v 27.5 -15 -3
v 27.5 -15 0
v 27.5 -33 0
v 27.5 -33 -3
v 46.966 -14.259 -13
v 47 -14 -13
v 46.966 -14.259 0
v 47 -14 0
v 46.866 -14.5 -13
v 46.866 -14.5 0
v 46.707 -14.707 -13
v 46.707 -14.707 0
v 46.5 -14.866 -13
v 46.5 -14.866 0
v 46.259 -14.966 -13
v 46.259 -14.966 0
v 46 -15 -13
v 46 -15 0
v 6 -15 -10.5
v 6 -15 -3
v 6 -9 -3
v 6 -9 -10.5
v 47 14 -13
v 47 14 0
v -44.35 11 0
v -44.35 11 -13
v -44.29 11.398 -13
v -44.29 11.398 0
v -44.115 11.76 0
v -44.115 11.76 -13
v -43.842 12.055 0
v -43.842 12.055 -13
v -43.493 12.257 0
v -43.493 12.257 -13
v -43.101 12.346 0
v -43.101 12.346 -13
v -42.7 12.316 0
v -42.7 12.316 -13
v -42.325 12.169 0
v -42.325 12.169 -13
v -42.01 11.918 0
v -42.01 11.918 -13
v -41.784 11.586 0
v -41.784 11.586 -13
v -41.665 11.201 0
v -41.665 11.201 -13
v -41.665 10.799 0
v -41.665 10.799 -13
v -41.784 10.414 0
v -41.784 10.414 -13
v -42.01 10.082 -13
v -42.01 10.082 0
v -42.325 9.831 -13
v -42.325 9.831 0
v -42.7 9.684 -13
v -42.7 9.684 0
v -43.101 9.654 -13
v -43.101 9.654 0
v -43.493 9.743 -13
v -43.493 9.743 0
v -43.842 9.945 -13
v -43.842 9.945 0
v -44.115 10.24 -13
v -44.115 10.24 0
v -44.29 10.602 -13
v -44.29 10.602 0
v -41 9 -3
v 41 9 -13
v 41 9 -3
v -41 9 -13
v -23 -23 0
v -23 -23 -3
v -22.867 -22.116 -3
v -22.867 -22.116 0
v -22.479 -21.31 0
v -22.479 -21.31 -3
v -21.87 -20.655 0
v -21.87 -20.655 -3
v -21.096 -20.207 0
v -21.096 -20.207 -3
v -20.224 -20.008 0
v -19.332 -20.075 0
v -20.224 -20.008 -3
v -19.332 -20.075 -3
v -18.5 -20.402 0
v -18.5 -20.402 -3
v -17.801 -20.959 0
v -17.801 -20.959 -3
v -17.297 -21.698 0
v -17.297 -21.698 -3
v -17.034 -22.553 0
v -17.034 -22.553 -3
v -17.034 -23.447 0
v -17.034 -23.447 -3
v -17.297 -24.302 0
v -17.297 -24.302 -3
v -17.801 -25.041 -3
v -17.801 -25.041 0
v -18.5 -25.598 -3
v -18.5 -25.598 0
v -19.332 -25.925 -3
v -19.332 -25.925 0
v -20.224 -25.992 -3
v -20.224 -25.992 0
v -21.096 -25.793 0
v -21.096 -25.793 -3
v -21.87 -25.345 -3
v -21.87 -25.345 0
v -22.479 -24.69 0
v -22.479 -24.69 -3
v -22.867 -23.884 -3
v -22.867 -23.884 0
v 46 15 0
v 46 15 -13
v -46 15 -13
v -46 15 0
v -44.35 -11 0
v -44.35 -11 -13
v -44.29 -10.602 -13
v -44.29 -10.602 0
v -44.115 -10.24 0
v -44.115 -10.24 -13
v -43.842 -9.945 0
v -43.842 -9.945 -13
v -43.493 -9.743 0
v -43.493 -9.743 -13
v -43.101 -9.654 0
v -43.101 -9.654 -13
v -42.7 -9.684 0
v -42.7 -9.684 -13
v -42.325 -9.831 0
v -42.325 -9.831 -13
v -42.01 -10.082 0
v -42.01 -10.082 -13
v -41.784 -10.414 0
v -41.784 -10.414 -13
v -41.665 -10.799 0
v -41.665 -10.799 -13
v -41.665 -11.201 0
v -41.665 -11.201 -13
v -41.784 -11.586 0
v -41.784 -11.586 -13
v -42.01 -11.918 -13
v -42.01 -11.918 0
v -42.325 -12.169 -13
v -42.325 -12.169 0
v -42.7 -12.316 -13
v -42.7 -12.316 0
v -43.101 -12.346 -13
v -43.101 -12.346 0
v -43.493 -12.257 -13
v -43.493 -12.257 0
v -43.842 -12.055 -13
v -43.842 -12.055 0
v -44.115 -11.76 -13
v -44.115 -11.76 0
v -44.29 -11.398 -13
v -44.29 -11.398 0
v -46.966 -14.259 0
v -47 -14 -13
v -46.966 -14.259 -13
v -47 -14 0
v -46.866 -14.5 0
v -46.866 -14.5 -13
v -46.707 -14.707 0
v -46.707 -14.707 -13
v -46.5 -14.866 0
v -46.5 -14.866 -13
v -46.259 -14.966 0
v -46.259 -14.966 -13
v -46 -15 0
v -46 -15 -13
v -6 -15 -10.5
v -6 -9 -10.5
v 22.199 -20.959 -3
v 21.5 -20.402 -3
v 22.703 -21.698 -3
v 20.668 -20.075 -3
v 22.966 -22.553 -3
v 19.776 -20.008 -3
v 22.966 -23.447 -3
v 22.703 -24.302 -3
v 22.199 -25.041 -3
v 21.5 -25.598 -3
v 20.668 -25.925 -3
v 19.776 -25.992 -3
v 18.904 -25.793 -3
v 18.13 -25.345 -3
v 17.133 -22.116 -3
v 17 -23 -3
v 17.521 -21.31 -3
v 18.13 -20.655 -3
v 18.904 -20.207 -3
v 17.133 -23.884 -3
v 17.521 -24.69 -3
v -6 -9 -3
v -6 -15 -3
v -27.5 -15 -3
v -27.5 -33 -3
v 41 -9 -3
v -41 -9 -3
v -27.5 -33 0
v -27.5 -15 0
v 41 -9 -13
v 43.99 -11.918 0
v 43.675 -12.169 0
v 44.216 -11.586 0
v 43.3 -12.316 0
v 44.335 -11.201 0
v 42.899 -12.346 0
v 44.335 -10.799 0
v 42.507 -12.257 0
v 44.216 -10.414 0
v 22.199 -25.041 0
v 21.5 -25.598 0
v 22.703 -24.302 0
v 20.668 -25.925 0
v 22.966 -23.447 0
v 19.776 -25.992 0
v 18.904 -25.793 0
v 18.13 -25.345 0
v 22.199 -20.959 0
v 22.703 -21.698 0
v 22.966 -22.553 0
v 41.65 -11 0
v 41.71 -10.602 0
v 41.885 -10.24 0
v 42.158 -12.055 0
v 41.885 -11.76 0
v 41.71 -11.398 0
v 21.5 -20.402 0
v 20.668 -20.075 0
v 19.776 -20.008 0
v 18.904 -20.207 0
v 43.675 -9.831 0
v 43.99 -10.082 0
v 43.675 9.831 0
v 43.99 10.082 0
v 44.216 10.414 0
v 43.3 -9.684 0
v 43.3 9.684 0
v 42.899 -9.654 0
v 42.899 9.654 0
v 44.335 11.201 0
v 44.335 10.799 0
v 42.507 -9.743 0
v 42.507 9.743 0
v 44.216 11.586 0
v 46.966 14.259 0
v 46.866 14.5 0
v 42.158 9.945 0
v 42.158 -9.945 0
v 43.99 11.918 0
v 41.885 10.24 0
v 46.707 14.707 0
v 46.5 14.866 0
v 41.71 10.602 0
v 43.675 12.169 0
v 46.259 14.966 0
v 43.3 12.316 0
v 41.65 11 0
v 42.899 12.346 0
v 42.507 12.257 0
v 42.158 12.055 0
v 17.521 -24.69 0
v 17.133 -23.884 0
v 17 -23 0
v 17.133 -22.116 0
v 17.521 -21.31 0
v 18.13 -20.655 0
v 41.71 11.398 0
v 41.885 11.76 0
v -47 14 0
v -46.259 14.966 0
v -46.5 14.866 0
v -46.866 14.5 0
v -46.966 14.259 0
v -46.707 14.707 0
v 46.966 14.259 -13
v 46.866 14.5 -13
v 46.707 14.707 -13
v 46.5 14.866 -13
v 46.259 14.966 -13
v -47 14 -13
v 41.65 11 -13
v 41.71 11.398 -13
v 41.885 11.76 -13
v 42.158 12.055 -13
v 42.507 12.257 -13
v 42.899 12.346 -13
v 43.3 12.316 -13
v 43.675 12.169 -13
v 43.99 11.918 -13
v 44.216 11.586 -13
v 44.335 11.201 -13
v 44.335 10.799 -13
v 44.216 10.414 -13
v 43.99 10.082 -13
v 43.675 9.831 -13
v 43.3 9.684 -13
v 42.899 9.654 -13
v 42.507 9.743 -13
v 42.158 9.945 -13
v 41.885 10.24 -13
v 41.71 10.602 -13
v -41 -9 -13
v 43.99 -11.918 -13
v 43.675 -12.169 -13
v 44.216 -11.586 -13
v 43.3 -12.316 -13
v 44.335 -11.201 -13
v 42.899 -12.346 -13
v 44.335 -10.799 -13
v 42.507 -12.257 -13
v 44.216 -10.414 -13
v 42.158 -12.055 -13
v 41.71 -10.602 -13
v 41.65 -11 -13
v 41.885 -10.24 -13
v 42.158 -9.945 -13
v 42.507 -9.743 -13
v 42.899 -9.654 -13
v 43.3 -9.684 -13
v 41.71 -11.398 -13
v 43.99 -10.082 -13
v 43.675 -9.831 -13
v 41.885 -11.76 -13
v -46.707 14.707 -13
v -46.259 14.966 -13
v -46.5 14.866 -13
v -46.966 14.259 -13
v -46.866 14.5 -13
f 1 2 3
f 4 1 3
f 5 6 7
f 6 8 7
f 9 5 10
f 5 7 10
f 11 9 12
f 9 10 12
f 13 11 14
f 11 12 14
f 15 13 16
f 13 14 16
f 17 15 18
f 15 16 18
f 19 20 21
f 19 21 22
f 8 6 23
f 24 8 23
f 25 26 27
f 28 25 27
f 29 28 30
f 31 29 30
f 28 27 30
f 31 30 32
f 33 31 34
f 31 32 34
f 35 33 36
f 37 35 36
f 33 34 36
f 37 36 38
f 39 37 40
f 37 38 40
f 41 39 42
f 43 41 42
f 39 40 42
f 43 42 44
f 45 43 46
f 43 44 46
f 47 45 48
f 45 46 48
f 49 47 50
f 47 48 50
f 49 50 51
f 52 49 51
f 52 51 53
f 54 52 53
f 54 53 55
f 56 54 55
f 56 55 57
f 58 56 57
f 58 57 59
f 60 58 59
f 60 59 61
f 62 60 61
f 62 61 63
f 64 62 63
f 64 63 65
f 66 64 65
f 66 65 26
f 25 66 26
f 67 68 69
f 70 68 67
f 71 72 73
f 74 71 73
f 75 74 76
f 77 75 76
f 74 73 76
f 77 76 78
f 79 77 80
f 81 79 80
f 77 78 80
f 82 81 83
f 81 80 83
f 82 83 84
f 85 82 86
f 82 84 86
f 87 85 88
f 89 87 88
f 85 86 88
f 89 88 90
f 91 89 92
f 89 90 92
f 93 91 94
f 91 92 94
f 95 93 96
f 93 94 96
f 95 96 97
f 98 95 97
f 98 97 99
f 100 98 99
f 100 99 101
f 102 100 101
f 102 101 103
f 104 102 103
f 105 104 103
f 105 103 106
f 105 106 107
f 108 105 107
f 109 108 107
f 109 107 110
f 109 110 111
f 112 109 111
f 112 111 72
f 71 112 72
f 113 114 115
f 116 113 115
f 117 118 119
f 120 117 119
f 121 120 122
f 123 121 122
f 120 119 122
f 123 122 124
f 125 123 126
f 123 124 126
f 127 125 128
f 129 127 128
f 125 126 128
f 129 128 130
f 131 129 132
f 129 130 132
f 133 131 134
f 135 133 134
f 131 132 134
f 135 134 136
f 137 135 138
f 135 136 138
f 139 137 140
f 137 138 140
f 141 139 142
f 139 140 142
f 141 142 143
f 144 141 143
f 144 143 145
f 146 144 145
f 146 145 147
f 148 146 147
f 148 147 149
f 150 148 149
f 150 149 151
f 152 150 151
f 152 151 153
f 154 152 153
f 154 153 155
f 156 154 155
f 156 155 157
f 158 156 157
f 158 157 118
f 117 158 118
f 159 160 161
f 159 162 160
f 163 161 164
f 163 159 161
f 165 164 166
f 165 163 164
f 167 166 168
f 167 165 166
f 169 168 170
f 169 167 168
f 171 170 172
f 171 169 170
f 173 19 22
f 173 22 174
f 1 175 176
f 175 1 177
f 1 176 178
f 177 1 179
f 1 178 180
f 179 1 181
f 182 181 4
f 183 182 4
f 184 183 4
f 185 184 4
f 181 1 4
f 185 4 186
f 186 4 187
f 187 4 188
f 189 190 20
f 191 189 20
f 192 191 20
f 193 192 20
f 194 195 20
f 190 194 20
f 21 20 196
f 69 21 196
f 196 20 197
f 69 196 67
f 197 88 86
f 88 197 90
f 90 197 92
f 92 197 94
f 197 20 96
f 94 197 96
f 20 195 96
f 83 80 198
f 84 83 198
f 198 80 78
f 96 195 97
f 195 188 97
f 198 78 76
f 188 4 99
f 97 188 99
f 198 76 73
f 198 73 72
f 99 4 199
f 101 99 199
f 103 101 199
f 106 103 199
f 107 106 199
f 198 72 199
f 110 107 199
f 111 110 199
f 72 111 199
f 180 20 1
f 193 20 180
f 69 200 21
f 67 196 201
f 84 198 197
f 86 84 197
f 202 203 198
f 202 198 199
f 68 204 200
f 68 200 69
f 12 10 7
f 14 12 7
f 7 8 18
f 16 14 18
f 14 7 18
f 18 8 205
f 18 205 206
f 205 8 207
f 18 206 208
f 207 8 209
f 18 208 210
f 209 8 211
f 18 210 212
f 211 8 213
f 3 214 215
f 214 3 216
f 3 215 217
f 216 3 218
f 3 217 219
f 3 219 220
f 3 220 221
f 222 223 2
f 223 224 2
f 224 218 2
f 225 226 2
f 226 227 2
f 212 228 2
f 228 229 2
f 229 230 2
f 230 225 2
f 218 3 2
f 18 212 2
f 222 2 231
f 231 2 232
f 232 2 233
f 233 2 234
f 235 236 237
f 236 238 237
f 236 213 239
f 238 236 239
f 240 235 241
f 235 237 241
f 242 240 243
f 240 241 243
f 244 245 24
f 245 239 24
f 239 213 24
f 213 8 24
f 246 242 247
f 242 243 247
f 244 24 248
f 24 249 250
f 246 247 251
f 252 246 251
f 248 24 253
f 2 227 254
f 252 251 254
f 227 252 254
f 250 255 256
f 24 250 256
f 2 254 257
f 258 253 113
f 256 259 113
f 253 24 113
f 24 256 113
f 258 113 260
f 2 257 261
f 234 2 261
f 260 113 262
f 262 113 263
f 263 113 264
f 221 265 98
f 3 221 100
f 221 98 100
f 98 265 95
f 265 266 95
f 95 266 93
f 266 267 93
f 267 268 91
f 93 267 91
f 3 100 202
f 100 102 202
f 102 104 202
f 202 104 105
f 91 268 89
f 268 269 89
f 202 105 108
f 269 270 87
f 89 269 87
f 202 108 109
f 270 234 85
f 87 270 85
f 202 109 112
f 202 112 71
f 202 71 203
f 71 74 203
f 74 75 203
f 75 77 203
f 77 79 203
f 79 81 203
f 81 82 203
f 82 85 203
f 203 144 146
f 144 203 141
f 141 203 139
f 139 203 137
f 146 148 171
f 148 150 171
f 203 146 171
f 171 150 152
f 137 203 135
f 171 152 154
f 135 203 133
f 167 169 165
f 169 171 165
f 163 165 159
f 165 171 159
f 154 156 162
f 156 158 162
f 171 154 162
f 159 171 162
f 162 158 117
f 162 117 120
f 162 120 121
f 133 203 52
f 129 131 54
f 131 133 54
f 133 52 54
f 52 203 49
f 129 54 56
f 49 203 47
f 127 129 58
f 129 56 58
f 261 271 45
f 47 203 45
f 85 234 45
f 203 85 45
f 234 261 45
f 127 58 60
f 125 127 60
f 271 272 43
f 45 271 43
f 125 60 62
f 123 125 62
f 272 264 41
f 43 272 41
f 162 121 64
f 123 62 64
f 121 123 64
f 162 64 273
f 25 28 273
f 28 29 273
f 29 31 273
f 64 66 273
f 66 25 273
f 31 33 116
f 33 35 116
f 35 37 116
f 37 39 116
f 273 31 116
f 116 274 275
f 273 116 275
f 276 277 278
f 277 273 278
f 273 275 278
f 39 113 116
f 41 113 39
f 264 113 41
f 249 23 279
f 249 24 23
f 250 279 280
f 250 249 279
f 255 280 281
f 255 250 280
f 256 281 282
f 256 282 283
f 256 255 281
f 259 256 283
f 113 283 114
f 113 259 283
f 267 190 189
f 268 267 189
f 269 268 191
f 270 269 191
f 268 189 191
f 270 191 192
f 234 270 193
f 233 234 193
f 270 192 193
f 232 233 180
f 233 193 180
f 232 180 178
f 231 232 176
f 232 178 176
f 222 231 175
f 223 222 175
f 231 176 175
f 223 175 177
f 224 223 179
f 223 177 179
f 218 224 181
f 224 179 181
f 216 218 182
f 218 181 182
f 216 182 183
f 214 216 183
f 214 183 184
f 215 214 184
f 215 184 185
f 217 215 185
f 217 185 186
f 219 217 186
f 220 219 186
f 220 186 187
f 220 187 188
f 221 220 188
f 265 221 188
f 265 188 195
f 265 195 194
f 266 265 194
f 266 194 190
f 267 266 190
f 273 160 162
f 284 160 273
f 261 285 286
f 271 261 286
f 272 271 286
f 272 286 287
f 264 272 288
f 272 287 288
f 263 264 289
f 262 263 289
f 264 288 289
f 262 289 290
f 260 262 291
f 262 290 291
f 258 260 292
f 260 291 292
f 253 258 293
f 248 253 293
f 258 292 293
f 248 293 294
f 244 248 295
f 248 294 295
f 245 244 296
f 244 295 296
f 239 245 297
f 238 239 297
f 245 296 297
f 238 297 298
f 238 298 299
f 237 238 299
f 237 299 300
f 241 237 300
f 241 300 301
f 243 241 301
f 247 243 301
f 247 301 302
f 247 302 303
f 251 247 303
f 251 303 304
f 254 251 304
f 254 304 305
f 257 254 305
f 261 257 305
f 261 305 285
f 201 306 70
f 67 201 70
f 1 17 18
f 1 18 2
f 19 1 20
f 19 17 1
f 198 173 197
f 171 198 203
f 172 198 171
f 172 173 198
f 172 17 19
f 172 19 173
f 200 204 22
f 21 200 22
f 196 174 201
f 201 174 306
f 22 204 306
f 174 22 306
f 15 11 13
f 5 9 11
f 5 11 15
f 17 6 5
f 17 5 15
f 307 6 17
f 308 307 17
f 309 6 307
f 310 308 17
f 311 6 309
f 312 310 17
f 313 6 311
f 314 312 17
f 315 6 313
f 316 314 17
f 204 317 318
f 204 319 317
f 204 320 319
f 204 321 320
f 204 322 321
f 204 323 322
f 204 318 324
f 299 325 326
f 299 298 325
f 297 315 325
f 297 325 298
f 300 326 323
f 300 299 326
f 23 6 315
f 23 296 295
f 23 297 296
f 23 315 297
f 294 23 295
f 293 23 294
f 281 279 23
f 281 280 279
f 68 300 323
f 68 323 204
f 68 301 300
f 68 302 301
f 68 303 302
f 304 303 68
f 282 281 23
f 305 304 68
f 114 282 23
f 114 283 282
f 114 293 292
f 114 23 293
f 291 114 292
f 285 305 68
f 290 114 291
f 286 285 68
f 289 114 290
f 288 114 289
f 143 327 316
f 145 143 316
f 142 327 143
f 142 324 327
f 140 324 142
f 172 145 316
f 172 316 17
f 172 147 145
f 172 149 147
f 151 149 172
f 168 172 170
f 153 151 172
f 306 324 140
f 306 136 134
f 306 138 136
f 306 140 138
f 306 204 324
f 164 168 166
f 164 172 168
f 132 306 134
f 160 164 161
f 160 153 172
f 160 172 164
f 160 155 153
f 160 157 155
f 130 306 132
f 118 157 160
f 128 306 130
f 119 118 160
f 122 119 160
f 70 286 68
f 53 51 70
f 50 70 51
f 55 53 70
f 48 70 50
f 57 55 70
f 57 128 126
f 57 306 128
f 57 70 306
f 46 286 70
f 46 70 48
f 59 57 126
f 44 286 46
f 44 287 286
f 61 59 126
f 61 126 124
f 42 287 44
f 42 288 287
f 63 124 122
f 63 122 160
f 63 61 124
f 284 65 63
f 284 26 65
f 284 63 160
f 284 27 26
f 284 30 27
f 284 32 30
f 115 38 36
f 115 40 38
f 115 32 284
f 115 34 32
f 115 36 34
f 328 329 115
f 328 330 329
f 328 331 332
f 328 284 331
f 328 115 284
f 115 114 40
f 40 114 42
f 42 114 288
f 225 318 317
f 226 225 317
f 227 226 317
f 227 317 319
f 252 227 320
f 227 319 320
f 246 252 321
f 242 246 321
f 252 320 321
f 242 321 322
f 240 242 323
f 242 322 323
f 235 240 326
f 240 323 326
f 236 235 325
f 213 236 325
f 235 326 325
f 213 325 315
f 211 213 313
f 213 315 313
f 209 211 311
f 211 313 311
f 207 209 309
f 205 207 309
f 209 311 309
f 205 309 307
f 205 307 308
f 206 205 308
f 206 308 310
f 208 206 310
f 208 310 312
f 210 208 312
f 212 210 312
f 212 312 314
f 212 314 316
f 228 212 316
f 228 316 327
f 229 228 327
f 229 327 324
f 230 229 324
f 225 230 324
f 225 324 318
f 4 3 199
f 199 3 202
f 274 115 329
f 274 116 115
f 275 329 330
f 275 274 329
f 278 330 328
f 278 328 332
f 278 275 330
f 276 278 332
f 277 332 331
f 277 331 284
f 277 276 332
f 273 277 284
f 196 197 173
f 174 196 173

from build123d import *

# Parameters (mm, degrees)
SKETCH001_W          = 94
SKETCH001_H          = 30
PAD_DEPTH            = 13
SKETCH002_R          = 1.35
HOLE_DEPTH           = 25
SKETCH_W             = 82
SKETCH_H             = 18
POCKET_DEPTH         = 10
SKETCH003_W          = 55
SKETCH003_H          = 21
PAD001_DEPTH         = 3
FILLET_R             = 1
SKETCH004_R          = 3
HOLE001_DEPTH        = 25
SKETCH010_W          = 12
SKETCH010_H          = 7.5
POCKET001_DEPTH      = 6
BODY_PLACEMENT_ANGLE = 180


with BuildPart() as part:
    # Sketch001 → Pad (new body)
    with BuildSketch(Plane.XY):
        Rectangle(SKETCH001_W, SKETCH001_H)
    extrude(amount=-PAD_DEPTH)

    # Sketch002 (on Face5 of Pad) → Hole (cut)
    with BuildSketch(Plane.XY):
        with Locations((-43, 11)):
            Circle(SKETCH002_R)
        with Locations((-43, -11)):
            Circle(SKETCH002_R)
        with Locations((43, 11)):
            Circle(SKETCH002_R)
        with Locations((43, -11)):
            Circle(SKETCH002_R)
    extrude(amount=-HOLE_DEPTH, mode=Mode.SUBTRACT)

    # Sketch → Pocket (cut)
    with BuildSketch(Plane.XY):
        Rectangle(SKETCH_W, SKETCH_H)
    extrude(amount=-POCKET_DEPTH, mode=Mode.SUBTRACT)

    # Sketch003 (on Face5 of Pocket) → Pad001 (join)
    with BuildSketch(Plane(origin=(0, 0, -13), x_dir=(1, 0, 0), z_dir=(0, 0, -1))):
        with Locations((0, 22.5)):
            Rectangle(SKETCH003_W, SKETCH003_H)
    extrude(amount=-PAD001_DEPTH)

    # Fillet
    fillet_edges = [part.edges().sort_by_distance(p)[0] for p in [
        (47, -15, -6.5),
        (47, 15, -6.5),
        (-47, 15, -6.5),
        (-47, -15, -6.5),
    ]]
    fillet(fillet_edges, radius=FILLET_R)

    # Sketch004 (on Face22 of Fillet) → Hole001 (cut)
    with BuildSketch(Plane.XY.offset(-10)):
        with Locations((20, -23)):
            Circle(SKETCH004_R)
        with Locations((-20, -23)):
            Circle(SKETCH004_R)
    extrude(amount=-HOLE001_DEPTH, mode=Mode.SUBTRACT)

    # Sketch010 (on Face7 of Hole001) → Pocket001 (cut)
    with BuildSketch(Plane.XZ.offset(15)):
        with Locations((0, -6.25)):
            Rectangle(SKETCH010_W, SKETCH010_H)
    extrude(amount=-POCKET001_DEPTH, mode=Mode.SUBTRACT)


with BuildPart() as part_1:
    # Body placement: moved
    add(part.part.moved(Location((0, 0, -13))).rotate(Axis((0, 0, -13), (0, 1, 0)), BODY_PLACEMENT_ANGLE))


solid = part_1.part
